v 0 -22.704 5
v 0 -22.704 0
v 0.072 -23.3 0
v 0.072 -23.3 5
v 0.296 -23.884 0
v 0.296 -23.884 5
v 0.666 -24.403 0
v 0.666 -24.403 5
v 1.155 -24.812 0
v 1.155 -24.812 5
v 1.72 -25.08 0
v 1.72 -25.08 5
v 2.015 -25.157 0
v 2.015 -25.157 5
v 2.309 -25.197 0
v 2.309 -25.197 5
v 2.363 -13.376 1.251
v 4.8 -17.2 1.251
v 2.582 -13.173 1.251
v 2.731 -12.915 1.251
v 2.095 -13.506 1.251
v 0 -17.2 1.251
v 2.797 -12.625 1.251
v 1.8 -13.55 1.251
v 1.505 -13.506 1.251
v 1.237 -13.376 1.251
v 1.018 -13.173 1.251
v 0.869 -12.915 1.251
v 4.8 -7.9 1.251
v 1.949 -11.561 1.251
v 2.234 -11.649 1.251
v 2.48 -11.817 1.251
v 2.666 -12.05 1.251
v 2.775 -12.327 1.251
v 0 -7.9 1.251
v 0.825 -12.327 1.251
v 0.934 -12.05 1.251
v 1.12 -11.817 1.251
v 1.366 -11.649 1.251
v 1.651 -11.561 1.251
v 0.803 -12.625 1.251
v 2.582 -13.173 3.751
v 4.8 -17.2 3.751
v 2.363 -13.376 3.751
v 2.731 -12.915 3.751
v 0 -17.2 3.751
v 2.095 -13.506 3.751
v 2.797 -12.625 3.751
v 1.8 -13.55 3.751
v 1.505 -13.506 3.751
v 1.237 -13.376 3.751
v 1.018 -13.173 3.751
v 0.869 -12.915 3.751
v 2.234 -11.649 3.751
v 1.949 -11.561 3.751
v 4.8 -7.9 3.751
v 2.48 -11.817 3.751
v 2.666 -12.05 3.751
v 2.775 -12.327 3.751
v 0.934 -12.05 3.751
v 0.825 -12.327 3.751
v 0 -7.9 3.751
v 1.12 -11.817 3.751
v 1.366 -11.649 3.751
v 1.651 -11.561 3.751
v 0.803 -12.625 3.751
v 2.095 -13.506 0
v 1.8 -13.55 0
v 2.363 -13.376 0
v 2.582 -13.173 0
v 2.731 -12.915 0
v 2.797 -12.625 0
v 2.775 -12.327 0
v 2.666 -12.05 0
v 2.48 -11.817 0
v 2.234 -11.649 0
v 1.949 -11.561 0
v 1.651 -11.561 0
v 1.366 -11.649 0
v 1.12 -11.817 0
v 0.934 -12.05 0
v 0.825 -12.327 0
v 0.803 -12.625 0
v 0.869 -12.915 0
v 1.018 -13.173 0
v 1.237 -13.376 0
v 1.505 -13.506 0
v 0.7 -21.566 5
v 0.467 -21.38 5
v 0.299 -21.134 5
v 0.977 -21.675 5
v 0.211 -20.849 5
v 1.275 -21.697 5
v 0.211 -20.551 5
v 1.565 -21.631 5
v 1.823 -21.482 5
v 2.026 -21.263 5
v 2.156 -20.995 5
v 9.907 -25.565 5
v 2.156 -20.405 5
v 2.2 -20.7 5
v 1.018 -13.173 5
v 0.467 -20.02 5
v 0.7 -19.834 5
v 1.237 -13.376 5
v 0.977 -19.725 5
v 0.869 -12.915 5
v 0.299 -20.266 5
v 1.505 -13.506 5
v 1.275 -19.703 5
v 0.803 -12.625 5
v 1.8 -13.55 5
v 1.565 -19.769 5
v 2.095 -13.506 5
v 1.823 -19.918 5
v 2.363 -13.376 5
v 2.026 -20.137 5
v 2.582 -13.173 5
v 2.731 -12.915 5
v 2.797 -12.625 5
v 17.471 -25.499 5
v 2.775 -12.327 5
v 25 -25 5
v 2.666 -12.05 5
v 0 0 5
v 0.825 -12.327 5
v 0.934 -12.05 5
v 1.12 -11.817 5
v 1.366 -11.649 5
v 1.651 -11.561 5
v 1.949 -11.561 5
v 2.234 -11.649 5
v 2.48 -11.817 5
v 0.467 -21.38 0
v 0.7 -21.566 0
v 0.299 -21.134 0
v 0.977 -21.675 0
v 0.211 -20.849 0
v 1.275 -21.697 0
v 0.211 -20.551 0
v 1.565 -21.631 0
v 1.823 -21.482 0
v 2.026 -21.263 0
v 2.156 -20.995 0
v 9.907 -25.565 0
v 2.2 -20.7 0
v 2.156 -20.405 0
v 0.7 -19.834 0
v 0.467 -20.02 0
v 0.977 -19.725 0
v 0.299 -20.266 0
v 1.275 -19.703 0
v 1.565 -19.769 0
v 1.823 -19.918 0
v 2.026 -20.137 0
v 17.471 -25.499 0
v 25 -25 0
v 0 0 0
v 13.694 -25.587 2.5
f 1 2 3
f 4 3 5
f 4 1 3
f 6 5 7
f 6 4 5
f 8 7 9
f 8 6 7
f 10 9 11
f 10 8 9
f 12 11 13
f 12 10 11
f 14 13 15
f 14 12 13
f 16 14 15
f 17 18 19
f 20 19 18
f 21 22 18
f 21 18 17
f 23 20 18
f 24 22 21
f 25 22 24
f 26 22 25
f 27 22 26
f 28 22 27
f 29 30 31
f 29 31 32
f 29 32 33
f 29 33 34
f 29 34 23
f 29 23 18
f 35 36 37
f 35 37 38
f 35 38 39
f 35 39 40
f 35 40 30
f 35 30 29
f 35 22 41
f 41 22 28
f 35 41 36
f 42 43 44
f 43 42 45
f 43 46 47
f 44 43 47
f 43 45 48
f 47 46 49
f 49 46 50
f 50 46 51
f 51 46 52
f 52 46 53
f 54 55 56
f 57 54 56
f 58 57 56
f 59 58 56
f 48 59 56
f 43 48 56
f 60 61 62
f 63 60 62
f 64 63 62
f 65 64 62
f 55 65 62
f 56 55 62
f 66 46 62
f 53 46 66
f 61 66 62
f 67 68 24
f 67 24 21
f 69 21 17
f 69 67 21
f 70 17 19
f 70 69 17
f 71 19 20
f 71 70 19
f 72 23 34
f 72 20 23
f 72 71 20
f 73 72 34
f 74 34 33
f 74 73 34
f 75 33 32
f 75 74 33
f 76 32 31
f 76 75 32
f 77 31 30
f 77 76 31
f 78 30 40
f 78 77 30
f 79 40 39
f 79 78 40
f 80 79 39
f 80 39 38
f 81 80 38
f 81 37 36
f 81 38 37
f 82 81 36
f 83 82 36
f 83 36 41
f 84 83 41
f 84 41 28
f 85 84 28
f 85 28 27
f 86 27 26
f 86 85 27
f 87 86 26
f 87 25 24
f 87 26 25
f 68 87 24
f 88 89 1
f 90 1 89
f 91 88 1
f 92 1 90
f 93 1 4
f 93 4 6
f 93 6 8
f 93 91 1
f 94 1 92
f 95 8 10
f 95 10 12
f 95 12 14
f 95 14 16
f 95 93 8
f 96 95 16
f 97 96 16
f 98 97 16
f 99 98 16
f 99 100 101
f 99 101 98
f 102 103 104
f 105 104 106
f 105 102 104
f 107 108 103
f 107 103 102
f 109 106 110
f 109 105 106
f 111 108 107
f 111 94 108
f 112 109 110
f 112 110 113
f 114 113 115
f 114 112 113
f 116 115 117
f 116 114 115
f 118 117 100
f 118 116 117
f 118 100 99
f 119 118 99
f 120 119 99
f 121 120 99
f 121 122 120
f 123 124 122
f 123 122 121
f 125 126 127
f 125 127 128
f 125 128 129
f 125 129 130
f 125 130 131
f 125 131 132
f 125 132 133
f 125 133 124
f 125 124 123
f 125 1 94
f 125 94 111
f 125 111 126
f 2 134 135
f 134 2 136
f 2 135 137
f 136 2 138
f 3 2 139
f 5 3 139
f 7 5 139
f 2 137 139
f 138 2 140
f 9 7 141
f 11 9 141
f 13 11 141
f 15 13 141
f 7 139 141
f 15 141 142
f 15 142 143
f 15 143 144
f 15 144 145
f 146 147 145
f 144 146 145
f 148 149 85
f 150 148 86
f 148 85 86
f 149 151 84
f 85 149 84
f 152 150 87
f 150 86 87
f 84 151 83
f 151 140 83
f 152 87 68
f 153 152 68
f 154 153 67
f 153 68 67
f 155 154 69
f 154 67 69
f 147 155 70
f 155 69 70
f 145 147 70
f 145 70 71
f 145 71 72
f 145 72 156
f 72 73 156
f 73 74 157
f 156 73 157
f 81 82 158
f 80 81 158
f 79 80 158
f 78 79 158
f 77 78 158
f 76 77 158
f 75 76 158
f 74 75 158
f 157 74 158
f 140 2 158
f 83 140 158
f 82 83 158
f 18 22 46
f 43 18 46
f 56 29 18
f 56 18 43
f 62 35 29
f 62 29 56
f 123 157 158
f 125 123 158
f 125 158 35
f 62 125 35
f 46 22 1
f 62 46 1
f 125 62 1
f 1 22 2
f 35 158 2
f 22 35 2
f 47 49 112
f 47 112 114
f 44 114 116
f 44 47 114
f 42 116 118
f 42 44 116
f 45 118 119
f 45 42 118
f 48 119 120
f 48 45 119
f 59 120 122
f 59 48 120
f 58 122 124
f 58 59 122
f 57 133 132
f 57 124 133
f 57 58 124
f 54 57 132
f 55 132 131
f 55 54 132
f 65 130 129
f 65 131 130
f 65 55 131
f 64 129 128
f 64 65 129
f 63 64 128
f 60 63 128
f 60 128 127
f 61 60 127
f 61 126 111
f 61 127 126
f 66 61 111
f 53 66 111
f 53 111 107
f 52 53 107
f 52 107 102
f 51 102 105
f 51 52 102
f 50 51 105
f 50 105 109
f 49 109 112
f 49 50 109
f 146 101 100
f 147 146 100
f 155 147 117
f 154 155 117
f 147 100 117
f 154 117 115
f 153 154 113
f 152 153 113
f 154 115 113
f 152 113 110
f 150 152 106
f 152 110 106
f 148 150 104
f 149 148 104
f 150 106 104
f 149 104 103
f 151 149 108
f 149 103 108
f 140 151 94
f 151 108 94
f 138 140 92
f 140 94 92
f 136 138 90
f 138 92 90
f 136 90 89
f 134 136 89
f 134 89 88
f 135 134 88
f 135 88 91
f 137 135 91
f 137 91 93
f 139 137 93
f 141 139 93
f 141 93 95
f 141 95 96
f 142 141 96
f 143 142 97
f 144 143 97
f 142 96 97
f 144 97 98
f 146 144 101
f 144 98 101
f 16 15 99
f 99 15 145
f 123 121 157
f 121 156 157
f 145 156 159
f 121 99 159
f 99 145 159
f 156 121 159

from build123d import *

# Parameters (mm, degrees)
SALIENTE_EXTRUIR1_DEPTH    = 5
CROQUIS3_R                 = 1
CORTAR_EXTRUIR1_DEPTH      = 5
REDONDEO2_R                = 2.5
CROQUIS4_W                 = 2.5
CROQUIS4_H                 = 9.3
CORTAR_EXTRUIR2_DEPTH      = 4.8
CORTAR_EXTRUIR3_DEPTH      = 37.123740235
CORTAR_EXTRUIR3_DEPTH_BACK = 37.123740235
CROQUIS5_R                 = 1


with BuildPart() as part:
    # Croquis2 → Saliente-Extruir1 (new body)
    with BuildSketch(Plane.XY):
        with BuildLine():
            Line((0, 0), (0, -25))
            add(Edge.make_bspline(
                [(0, -25), (12.595125448, -26.182989262), (25, -25)],
                knots=[0, 0, 0, 0.592275768, 0.592275768, 0.592275768], degree=2))
            Line((25, -25), (0, 0))
        make_face()
    extrude(amount=SALIENTE_EXTRUIR1_DEPTH)

    # Croquis3 → Cortar-Extruir1 (cut)
    with BuildSketch(Plane.XY.offset(5)):
        with Locations((1.2, -20.7)):
            Circle(CROQUIS3_R)
    extrude(amount=-CORTAR_EXTRUIR1_DEPTH, mode=Mode.SUBTRACT)

    # Redondeo2
    redondeo2_edges = [part.edges().sort_by_distance(p)[0] for p in [
        (0, -25, 2.5),
    ]]
    fillet(redondeo2_edges, radius=REDONDEO2_R)

    # Croquis4 → Cortar-Extruir2 (cut)
    with BuildSketch(Plane.ZY):
        with Locations((2.501199275, -12.55)):
            Rectangle(CROQUIS4_W, CROQUIS4_H)
    extrude(amount=-CORTAR_EXTRUIR2_DEPTH, mode=Mode.SUBTRACT)

    # Croquis5 → Cortar-Extruir3 (cut, two sides: drawn at the far end of the back side and taken through both)
    with BuildSketch(Plane.XY.offset(5).offset(-CORTAR_EXTRUIR3_DEPTH_BACK)):
        with Locations(Location((1.8, -12.55, 0), (0, 0, 270))):
            Circle(CROQUIS5_R)
    extrude(amount=CORTAR_EXTRUIR3_DEPTH + CORTAR_EXTRUIR3_DEPTH_BACK, mode=Mode.SUBTRACT)


solid = part.part
